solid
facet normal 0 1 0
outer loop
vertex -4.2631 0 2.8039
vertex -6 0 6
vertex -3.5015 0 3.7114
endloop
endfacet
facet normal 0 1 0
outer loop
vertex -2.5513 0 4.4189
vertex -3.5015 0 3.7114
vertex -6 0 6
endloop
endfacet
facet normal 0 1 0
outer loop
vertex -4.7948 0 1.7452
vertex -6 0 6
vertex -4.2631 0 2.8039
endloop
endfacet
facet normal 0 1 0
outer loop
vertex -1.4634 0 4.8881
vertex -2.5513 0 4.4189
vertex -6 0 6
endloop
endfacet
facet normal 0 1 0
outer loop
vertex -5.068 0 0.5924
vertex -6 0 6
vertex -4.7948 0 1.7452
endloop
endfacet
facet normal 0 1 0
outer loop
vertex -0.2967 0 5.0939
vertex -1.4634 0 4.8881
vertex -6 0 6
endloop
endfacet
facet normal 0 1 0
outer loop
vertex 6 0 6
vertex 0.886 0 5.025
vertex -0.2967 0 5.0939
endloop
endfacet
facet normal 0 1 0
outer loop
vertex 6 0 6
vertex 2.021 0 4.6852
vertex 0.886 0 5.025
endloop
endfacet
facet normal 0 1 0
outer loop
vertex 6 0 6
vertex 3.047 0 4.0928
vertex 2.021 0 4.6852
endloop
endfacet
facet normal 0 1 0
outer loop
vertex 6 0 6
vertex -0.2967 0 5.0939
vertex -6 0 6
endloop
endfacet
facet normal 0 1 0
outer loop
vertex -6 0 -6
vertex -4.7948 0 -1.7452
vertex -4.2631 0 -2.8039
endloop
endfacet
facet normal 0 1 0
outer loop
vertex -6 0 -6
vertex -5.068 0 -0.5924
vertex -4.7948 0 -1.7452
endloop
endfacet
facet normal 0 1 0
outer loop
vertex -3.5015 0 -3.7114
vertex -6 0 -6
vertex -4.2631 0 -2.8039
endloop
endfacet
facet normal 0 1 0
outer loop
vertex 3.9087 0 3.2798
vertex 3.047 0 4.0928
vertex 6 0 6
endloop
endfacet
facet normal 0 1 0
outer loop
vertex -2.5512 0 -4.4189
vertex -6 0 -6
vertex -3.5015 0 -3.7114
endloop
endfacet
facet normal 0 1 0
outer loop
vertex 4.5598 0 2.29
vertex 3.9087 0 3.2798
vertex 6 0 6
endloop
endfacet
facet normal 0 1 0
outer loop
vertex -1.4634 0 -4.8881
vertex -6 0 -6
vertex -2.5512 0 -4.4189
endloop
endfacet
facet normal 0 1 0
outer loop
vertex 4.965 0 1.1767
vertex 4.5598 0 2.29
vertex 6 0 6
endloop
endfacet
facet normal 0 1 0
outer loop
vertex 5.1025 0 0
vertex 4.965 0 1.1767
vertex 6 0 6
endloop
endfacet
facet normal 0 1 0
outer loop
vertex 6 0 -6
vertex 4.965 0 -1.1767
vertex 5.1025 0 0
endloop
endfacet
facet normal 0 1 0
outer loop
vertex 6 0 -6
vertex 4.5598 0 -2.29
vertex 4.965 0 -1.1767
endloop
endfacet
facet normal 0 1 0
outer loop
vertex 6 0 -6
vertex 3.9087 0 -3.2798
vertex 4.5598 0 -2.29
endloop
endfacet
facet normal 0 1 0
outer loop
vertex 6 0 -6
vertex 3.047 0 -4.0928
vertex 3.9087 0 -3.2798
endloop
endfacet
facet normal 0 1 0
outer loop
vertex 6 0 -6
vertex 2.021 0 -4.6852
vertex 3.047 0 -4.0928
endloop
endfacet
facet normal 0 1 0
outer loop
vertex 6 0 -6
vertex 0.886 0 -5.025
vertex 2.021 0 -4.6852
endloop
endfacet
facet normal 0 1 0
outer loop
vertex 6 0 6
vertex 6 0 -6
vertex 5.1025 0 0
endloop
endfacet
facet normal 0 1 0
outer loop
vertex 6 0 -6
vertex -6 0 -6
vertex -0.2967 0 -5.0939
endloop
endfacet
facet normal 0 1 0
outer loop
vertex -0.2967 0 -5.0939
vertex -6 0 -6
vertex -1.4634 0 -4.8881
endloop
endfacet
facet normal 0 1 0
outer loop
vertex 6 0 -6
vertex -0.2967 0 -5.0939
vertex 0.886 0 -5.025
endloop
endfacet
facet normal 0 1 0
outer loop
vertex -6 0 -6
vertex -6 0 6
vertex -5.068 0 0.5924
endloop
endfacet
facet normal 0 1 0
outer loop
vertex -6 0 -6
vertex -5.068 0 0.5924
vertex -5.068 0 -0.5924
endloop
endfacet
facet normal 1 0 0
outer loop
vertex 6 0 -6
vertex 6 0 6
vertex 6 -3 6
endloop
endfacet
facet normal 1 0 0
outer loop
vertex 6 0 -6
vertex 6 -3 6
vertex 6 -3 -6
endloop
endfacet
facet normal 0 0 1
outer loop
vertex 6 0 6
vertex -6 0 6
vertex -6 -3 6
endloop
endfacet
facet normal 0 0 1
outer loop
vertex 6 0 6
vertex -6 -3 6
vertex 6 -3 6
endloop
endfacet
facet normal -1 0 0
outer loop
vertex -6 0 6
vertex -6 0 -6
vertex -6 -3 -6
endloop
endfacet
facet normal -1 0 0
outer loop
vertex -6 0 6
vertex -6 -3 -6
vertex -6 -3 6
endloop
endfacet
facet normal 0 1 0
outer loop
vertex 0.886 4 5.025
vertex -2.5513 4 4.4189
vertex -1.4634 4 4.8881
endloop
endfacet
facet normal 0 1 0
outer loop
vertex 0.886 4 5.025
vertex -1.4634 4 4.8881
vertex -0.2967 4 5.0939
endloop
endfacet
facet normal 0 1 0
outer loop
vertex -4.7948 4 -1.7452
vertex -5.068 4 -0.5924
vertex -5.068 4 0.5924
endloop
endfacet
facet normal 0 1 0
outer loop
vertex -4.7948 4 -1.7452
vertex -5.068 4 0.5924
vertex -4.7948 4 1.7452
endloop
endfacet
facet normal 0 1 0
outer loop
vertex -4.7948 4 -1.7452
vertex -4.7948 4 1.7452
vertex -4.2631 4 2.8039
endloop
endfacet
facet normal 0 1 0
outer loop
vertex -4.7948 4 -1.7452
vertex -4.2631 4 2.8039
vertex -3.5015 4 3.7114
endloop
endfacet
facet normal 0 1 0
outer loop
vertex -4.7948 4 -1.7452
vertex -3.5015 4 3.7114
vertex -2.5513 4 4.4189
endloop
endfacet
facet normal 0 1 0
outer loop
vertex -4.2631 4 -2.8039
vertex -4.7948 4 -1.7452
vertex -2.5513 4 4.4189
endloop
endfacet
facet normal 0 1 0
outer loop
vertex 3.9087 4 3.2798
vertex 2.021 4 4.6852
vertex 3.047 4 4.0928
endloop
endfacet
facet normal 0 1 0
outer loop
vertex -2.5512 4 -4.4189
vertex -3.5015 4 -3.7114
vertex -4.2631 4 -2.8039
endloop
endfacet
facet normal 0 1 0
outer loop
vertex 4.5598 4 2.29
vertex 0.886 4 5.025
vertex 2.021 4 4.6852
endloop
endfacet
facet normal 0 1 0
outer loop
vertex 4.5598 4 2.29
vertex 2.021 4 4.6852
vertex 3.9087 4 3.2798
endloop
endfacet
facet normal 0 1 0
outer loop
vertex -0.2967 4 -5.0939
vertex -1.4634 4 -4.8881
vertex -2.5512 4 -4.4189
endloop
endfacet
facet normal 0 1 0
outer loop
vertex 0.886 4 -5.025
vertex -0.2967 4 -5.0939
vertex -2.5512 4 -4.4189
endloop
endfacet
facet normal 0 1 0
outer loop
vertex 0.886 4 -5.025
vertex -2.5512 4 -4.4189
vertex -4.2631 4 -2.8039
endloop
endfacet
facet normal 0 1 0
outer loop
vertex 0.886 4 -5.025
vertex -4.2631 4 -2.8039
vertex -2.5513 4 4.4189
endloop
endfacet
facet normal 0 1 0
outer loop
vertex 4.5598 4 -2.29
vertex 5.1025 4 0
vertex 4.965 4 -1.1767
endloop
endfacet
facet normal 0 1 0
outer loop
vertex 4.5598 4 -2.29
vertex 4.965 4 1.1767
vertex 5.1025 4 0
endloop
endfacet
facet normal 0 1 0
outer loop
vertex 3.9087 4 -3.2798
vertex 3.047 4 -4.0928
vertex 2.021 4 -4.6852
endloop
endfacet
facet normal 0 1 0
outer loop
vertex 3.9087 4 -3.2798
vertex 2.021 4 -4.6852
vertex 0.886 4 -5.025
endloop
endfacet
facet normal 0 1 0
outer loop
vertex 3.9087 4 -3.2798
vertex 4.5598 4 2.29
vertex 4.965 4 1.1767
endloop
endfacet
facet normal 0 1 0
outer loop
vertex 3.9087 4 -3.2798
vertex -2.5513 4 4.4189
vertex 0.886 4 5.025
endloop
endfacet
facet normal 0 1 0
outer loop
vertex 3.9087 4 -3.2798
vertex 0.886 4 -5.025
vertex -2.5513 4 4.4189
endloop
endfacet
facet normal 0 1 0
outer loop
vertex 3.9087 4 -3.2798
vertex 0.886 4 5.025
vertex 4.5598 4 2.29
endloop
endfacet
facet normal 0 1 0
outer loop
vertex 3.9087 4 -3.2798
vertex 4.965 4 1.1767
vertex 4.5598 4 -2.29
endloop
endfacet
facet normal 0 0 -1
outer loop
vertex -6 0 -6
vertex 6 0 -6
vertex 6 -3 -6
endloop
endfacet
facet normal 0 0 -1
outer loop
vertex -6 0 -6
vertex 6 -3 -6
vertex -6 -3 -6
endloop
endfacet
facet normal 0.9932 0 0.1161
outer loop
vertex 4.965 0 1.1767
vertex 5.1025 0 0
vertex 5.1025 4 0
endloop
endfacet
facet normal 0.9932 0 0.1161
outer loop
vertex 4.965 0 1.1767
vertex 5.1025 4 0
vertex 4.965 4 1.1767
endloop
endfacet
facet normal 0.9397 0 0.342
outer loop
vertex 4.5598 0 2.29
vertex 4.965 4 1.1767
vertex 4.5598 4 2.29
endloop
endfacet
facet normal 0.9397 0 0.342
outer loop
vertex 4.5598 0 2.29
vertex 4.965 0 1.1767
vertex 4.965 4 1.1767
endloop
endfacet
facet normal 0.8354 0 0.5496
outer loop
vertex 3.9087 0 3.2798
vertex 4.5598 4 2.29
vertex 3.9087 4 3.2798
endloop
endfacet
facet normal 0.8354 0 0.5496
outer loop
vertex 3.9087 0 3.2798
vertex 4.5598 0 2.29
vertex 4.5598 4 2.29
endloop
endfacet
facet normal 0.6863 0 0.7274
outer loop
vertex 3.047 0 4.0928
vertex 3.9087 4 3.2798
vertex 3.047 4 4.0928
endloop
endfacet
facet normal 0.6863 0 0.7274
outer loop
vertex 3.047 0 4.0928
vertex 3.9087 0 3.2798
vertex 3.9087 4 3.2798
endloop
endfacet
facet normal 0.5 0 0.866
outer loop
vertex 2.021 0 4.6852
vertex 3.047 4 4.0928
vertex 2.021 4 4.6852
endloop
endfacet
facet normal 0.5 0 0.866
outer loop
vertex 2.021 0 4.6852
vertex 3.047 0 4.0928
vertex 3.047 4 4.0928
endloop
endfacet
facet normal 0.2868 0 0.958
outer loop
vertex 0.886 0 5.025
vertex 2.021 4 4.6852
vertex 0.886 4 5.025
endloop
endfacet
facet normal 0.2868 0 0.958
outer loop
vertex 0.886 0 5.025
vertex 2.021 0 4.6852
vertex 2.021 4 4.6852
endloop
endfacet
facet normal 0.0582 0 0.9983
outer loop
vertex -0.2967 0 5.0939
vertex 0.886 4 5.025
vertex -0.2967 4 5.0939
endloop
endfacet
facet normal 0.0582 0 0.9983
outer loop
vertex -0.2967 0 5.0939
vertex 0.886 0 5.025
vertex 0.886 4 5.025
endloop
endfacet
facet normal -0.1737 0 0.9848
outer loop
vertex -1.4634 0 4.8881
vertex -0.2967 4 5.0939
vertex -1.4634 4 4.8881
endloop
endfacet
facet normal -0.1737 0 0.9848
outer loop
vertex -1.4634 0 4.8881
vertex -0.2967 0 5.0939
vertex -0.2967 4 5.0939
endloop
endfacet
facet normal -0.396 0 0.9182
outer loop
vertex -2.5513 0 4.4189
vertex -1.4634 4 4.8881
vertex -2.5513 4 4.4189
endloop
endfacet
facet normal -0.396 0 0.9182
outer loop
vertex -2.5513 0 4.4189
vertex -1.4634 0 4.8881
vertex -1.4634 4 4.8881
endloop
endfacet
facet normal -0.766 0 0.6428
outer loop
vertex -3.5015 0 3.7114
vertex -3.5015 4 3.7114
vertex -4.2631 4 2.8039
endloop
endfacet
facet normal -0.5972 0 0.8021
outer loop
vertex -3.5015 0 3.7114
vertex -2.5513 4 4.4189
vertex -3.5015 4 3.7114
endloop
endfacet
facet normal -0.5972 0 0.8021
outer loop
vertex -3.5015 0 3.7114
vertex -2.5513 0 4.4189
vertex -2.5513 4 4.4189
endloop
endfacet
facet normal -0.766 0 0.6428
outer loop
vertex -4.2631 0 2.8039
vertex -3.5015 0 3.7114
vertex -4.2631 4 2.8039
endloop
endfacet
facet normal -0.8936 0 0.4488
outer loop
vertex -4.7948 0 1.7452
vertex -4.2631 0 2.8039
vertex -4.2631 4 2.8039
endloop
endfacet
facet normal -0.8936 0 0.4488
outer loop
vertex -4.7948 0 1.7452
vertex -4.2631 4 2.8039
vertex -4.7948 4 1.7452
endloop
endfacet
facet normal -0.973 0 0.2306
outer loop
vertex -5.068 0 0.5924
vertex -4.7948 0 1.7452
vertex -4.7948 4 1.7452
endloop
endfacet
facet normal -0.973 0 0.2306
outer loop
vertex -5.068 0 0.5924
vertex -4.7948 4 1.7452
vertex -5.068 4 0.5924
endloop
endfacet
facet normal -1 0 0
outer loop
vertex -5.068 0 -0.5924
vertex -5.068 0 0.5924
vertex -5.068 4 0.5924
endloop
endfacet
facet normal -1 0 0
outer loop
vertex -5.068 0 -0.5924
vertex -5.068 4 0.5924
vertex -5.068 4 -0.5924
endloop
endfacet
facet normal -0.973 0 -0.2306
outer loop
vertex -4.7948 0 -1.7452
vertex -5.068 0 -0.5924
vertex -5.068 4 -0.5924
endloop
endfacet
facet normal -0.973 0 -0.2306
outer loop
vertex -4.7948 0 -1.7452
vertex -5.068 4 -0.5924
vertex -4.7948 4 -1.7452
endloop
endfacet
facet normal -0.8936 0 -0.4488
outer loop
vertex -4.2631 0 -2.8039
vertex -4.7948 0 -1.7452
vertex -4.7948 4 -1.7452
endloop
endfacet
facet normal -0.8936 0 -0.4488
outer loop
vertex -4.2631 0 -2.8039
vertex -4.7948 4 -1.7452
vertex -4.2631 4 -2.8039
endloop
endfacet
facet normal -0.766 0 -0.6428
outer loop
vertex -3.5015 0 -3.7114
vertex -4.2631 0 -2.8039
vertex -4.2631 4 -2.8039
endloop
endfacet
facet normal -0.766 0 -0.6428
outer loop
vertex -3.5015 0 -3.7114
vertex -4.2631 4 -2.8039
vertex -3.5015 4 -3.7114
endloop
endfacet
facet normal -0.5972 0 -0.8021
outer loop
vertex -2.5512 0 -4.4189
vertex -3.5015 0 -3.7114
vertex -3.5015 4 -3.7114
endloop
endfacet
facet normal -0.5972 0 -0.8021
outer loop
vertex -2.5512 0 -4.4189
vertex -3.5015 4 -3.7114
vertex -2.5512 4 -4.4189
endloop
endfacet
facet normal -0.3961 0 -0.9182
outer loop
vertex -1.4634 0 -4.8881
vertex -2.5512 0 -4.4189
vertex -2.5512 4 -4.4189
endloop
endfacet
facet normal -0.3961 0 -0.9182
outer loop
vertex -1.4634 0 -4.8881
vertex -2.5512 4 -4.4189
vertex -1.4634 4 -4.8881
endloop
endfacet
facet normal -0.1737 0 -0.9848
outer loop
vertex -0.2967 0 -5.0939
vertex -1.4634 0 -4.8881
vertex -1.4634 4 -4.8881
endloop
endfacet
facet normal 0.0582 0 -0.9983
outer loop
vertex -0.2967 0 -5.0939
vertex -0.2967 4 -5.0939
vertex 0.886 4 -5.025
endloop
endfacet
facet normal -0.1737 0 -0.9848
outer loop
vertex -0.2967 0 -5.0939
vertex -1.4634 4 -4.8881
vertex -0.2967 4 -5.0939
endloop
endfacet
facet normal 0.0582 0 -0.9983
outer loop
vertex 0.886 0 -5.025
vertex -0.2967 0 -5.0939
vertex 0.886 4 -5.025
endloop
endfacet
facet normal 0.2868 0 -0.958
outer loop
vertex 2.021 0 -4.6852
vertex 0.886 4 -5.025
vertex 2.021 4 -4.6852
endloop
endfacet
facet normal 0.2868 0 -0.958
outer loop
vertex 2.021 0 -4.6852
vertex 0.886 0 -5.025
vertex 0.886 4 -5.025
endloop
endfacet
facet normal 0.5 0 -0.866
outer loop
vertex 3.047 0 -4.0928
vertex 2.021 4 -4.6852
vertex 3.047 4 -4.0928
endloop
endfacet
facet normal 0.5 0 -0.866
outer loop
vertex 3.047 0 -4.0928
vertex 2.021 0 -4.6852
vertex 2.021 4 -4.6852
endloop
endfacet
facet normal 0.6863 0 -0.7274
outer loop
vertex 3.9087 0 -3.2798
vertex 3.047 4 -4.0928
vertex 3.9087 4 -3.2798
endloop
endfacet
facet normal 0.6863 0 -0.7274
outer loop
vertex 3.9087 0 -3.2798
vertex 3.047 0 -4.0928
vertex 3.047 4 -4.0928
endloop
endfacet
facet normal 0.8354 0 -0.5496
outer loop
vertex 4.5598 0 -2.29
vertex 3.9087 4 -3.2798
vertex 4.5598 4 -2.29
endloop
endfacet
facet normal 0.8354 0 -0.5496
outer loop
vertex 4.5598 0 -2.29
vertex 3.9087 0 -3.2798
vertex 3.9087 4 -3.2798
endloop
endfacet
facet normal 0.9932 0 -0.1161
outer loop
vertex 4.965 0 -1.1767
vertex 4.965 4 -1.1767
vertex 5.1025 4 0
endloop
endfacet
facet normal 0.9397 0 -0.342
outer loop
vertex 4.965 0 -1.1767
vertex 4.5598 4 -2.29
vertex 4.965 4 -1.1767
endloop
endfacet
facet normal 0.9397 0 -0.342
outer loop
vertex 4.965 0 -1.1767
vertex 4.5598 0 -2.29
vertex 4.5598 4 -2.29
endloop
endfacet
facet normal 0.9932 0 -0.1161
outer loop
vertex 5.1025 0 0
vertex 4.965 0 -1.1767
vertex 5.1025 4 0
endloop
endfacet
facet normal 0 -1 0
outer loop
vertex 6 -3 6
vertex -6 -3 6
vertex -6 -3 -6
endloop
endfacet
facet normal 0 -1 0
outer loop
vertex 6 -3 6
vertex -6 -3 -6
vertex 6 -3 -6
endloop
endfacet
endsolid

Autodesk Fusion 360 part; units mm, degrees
sketch "Boceto1" plane through (0, 0, 0) normal (0, 1, 0) x (1, 0, 0)
  line L0 (6, 6) -> (-6, 6)
  line L1 (-6, 6) -> (-6, -6)
  line L2 (-6, -6) -> (6, -6)
  line L3 (6, -6) -> (6, 6)
  line L4 (6, 6) -> (-6, -6) construction
  line L5 (-6, 6) -> (6, -6) construction
  circle A0 centre (0, 0) radius 5.1025
  dimension "d2" = 12
  dimension "d3" = 12
extrude "Extruir1" add sketch "Boceto1" along normal blind 4 contours A0
extrude "Extruir2" add sketch "Boceto1" against normal blind 3 contours L0 L1 L2 L3 | A0
